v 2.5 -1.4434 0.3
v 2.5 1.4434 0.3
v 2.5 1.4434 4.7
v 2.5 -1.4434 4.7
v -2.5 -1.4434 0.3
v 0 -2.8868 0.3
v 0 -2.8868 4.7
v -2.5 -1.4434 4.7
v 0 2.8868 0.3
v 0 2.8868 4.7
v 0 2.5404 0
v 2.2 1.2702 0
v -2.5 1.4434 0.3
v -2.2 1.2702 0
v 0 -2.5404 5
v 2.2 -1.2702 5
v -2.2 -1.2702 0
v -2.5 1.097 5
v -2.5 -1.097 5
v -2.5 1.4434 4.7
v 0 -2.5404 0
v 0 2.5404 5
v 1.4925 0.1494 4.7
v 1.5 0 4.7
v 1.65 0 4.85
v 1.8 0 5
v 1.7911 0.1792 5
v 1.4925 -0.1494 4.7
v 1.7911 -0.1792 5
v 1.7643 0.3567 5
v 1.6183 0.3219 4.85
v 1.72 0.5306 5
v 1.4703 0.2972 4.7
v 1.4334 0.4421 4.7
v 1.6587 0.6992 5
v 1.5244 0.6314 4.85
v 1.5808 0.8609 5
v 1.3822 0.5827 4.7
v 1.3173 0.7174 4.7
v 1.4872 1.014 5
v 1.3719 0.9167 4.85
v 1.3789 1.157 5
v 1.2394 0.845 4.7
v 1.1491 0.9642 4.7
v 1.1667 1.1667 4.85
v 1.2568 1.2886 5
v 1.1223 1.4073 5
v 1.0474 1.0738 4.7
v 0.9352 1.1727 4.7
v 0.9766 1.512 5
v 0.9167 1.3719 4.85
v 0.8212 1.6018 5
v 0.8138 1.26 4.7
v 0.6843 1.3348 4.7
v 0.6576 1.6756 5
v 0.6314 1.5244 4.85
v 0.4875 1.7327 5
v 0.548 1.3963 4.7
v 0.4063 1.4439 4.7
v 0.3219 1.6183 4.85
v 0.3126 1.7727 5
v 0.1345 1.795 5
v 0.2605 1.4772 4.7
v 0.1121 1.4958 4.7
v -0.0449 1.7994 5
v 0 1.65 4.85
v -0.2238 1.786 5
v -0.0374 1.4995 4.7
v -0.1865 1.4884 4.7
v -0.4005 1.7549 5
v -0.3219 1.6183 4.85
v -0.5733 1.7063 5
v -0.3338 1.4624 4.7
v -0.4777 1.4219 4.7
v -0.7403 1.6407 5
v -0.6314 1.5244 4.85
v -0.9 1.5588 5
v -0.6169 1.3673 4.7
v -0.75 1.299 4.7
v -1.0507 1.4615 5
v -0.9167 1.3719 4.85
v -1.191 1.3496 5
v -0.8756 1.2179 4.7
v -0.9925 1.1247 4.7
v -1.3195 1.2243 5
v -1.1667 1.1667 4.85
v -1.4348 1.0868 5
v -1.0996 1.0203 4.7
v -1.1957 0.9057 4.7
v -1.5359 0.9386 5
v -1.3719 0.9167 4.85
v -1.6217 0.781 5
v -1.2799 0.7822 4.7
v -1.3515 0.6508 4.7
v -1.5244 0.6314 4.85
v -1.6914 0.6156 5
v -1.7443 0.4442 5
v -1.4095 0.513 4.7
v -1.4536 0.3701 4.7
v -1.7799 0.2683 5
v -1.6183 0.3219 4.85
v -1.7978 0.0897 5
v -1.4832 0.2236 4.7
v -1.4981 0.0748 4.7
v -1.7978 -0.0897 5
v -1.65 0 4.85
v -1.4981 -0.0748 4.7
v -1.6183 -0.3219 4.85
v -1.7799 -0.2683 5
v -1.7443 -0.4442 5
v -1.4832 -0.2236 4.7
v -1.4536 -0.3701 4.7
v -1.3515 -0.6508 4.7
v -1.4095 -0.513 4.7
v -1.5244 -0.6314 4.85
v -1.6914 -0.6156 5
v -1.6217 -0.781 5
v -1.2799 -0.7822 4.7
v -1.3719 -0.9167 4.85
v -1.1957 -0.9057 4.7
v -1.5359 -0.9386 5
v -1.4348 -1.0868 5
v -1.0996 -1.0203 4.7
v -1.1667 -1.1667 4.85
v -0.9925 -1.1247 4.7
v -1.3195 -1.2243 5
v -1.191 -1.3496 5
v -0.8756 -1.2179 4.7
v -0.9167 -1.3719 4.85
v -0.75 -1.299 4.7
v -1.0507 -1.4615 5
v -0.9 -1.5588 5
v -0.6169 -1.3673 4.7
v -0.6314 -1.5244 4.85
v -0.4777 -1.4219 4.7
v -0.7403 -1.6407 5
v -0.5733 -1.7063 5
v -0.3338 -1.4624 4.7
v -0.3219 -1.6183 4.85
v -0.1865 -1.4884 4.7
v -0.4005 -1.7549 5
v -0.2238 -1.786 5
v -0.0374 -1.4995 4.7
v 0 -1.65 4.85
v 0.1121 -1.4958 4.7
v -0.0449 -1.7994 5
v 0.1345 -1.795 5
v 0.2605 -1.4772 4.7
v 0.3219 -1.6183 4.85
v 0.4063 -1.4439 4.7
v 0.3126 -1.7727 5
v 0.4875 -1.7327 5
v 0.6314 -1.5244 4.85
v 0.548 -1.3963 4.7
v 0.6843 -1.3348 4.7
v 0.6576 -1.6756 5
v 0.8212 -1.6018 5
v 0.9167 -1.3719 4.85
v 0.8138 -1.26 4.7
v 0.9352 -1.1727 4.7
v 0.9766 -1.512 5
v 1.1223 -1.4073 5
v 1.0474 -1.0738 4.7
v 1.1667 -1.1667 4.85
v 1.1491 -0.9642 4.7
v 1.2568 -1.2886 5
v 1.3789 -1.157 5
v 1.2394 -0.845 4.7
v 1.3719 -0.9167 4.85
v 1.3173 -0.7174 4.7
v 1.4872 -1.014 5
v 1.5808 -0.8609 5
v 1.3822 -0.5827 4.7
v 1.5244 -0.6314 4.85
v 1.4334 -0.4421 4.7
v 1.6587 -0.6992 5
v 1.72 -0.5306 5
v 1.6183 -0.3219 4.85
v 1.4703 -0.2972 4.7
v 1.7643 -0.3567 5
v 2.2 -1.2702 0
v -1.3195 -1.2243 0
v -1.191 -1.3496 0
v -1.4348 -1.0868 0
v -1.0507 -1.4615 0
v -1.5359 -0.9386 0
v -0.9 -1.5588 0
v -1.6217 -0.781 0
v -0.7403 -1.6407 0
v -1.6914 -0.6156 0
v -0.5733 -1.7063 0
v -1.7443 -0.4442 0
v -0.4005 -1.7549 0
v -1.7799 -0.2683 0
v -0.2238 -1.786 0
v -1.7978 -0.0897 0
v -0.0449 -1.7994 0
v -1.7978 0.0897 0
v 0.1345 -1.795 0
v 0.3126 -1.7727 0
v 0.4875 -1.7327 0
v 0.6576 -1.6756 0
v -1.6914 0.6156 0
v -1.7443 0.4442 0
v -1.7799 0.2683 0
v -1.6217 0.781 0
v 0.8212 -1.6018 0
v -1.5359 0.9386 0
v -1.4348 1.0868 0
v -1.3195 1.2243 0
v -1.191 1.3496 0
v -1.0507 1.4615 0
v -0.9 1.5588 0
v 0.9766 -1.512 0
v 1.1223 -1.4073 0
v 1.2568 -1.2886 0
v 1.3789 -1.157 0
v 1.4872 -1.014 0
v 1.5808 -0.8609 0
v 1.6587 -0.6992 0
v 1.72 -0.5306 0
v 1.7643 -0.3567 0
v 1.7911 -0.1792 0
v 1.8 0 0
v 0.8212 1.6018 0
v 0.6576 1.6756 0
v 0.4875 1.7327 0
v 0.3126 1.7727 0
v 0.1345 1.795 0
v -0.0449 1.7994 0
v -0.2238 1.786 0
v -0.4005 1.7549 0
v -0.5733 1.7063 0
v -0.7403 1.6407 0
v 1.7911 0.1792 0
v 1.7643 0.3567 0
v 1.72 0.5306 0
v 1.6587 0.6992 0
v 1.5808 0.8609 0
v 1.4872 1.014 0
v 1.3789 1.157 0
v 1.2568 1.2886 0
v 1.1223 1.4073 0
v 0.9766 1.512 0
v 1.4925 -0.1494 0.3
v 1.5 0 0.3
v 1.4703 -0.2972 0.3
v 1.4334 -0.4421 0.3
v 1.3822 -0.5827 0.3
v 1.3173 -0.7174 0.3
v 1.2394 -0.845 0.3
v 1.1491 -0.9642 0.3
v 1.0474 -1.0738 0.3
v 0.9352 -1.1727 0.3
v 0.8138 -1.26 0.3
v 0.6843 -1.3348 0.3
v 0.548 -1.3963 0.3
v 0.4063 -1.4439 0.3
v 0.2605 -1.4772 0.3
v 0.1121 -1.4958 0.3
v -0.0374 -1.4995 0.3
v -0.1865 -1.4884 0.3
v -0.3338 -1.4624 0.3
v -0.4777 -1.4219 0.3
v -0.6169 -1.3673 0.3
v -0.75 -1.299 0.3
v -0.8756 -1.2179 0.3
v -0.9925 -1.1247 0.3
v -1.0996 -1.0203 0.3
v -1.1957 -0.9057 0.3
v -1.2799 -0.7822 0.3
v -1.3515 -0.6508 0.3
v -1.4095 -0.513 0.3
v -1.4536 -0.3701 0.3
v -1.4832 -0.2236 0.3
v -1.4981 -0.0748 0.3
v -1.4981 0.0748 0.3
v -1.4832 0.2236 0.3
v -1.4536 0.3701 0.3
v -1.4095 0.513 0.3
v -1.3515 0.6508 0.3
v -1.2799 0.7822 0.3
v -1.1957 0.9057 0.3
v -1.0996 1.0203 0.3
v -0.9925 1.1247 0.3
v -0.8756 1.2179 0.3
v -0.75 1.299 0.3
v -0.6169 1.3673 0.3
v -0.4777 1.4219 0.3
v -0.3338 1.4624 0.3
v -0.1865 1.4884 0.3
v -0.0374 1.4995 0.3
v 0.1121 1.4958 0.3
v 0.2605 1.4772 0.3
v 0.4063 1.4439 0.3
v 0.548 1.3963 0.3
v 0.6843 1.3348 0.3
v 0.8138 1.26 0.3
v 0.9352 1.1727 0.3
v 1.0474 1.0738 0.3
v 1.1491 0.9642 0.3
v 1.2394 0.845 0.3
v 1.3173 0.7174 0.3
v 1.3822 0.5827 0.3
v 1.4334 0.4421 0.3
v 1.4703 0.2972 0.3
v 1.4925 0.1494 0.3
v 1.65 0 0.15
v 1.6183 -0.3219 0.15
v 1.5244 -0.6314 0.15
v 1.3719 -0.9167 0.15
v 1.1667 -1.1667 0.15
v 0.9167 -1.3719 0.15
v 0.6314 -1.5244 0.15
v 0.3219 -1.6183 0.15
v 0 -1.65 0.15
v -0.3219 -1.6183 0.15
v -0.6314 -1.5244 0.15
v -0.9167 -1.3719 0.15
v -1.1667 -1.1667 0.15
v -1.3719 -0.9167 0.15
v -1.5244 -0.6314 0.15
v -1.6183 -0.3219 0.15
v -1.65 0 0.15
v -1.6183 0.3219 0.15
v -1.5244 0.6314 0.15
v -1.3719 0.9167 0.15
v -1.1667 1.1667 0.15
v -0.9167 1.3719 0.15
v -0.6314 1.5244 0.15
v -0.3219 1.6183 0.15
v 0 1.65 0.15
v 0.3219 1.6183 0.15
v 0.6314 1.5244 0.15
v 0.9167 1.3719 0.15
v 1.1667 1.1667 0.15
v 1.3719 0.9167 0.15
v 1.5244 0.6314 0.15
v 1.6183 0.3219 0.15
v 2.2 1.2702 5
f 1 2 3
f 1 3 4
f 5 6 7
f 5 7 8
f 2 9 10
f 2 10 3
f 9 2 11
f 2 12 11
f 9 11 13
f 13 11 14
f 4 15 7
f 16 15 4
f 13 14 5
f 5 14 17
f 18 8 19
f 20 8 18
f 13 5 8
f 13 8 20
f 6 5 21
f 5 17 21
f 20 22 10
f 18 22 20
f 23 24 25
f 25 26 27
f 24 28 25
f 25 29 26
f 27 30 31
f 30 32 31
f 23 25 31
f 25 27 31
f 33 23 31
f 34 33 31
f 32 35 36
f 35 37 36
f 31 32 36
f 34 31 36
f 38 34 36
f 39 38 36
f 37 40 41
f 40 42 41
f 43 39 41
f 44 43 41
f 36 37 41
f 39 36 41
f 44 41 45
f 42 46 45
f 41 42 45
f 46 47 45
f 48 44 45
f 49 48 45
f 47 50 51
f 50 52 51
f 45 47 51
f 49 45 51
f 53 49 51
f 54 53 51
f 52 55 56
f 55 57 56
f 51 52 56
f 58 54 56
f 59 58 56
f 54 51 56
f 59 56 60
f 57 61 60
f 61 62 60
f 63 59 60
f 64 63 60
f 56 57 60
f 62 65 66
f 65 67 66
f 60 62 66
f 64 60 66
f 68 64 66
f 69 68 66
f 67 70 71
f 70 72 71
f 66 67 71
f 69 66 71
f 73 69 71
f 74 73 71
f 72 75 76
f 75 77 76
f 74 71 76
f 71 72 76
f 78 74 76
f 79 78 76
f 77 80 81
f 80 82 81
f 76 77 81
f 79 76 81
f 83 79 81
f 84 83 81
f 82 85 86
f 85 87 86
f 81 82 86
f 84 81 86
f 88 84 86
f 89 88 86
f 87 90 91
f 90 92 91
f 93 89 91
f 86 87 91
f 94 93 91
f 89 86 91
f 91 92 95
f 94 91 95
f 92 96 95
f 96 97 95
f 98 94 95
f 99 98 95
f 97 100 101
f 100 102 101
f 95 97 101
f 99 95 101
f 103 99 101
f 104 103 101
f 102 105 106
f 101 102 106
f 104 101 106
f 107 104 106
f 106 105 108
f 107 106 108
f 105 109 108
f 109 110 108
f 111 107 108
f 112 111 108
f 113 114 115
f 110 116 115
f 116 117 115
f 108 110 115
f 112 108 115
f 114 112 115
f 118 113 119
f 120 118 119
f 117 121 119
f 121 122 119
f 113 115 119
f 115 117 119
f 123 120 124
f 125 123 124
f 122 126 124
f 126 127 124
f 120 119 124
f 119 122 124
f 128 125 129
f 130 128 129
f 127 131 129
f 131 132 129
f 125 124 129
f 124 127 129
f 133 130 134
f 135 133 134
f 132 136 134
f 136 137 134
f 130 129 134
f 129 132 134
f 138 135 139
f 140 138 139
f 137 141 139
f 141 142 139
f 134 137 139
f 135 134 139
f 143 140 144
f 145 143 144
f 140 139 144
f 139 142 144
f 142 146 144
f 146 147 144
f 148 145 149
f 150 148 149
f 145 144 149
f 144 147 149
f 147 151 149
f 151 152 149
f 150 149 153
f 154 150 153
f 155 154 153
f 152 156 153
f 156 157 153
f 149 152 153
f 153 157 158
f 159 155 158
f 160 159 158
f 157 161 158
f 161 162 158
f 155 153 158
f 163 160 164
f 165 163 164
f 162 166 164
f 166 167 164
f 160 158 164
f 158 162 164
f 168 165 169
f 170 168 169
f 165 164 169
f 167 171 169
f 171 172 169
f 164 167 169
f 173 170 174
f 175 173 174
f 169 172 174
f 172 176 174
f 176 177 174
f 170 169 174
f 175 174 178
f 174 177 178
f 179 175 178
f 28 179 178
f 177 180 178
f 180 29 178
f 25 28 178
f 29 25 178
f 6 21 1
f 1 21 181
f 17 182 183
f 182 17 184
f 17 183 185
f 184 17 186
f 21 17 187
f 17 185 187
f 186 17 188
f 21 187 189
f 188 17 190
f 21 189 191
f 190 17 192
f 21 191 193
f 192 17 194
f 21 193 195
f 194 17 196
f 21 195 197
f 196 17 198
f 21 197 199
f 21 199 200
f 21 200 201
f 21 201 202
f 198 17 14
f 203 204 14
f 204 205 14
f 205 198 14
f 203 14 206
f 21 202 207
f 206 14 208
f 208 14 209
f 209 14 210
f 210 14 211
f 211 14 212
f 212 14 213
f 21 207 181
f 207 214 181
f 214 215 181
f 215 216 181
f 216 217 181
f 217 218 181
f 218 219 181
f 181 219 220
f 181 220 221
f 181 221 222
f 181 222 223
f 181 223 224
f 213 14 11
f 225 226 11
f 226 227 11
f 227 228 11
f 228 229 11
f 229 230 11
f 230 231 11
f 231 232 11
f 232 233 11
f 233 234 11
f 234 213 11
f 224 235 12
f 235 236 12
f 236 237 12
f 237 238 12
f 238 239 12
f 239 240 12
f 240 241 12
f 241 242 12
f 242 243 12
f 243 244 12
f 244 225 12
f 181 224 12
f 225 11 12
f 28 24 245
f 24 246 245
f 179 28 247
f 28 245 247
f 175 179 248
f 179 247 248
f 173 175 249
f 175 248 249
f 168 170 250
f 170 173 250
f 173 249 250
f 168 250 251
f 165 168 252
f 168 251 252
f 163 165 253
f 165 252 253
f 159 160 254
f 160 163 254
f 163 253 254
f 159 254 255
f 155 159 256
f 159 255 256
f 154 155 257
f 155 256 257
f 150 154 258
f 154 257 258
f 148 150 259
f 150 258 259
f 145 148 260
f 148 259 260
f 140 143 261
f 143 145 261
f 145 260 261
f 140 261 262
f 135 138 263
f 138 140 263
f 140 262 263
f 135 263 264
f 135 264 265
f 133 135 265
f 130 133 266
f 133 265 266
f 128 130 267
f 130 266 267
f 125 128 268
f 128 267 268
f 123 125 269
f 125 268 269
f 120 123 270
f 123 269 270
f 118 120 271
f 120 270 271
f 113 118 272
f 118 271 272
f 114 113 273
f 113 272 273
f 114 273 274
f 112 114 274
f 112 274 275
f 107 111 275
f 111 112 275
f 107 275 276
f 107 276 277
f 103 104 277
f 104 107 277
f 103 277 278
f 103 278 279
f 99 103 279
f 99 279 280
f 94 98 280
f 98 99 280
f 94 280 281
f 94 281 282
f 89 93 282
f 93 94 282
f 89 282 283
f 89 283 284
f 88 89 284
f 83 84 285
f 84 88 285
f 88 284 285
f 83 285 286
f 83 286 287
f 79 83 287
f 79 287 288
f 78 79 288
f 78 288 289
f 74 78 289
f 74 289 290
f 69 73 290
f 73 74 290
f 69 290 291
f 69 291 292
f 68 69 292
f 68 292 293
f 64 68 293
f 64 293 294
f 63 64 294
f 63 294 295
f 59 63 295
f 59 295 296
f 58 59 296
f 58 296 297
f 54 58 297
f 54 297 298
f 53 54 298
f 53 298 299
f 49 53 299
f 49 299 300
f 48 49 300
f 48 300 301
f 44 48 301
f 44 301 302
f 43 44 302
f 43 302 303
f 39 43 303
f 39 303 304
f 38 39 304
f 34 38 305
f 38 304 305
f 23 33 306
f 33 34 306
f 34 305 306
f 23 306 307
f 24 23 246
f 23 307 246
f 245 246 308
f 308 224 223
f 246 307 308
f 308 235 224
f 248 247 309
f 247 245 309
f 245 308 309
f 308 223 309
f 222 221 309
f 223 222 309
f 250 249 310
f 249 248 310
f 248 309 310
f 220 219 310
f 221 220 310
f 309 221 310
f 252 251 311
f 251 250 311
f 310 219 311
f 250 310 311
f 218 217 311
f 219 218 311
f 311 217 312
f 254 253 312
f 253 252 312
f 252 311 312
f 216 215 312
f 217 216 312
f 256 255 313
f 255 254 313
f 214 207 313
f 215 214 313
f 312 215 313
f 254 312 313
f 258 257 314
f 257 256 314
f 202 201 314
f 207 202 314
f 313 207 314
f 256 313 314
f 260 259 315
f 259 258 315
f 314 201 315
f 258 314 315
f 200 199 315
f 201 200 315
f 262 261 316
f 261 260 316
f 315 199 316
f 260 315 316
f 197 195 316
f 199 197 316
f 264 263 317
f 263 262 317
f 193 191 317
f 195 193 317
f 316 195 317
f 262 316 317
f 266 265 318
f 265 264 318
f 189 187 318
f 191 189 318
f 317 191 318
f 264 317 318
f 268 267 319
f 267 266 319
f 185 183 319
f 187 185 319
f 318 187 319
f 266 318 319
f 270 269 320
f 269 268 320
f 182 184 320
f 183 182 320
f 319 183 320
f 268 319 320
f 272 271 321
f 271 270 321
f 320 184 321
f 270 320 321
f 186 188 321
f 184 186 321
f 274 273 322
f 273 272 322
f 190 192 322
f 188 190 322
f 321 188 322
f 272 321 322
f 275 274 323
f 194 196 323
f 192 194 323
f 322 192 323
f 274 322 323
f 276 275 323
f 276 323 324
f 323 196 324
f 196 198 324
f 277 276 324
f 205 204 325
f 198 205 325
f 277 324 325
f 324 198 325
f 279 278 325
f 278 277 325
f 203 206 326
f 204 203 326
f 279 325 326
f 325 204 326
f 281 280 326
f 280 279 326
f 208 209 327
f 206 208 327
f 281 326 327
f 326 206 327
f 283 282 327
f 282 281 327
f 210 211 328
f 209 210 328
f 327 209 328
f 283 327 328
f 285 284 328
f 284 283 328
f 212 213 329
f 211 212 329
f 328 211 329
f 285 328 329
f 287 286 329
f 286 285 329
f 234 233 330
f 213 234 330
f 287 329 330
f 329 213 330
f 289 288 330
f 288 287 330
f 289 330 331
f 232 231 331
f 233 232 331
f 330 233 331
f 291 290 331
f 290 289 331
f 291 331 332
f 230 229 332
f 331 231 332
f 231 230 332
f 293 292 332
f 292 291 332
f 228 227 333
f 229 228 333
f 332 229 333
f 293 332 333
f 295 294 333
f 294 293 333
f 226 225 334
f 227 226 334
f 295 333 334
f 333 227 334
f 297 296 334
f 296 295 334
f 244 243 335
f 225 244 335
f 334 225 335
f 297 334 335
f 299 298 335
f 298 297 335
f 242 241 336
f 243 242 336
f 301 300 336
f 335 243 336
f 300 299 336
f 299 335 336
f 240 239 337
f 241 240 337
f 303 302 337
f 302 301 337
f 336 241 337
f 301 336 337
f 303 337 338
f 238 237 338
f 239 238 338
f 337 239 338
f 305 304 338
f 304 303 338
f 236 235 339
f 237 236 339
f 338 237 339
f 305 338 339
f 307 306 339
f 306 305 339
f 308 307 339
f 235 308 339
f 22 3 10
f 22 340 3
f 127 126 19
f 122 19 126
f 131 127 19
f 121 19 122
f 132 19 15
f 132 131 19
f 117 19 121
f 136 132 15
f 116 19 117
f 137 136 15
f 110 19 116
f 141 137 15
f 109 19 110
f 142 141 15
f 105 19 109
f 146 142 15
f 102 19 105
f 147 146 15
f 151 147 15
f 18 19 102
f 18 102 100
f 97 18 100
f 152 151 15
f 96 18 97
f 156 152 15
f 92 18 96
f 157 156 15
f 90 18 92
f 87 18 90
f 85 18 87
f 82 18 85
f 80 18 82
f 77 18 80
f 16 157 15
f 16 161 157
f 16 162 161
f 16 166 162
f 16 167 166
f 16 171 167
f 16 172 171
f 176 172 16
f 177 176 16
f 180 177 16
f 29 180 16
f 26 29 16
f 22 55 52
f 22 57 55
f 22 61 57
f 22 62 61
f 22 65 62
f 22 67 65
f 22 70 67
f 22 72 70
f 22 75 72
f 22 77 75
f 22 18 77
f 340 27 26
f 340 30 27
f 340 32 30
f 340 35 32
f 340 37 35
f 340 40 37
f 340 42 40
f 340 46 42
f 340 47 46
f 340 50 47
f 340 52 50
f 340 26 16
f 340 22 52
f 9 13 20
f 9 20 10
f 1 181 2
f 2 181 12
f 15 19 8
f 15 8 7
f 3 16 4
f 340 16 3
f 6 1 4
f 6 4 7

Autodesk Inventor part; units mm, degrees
ref_plane "YZ Plane" through (0, 0, 0) normal (1, 0, 0) x (0, 1, 0)
ref_plane "XZ Plane" through (0, 0, 0) normal (0, 1, 0) x (-1, 0, 0)
ref_plane "XY Plane" through (0, 0, 0) normal (0, 0, 1) x (1, 0, 0)
sketch "Skizze1" plane through (0, 0, 0) normal (0, 0, 1) x (1, 0, 0)
  line L0 (0, 2.8868) -> (2.5, 1.4434)
  line L1 (2.5, 1.4434) -> (2.5, -1.4434)
  line L2 (2.5, -1.4434) -> (0, -2.8868)
  line L3 (0, -2.8868) -> (-2.5, -1.4434)
  line L4 (-2.5, -1.4434) -> (-2.5, 1.4434)
  line L5 (-2.5, 1.4434) -> (0, 2.8868)
  circle A0 centre (0, 0) radius 1.5
  dimension "d0" = 5
  dimension "d1" = 3
extrude "Extrusion1" add sketch "Skizze1" along normal blind 5
chamfer "Fase1" distance 0.3 angle 45 13 edges at (1.25, -2.1651, 5) (-1.25, -2.1651, 5) (2.5, 0, 5) (1.25, 2.1651, 5) (-1.25, 2.1651, 5) (1.25, -2.1651, 0) (2.5, 0, 0) (-1.25, -2.1651, 0) (1.25, 2.1651, 0) (-1.25, 2.1651, 0) (-2.5, 0, 0) (-1.5, 0, 5) (-1.5, 0, 0)
thread "Gewinde1" size "M3x0.5" class "6H" standard "ANSI Metric M Profile" full length
properties part number "Distanzhuelse_M3x5mm" material "Nickel-Kupfer-Legierung 400"
